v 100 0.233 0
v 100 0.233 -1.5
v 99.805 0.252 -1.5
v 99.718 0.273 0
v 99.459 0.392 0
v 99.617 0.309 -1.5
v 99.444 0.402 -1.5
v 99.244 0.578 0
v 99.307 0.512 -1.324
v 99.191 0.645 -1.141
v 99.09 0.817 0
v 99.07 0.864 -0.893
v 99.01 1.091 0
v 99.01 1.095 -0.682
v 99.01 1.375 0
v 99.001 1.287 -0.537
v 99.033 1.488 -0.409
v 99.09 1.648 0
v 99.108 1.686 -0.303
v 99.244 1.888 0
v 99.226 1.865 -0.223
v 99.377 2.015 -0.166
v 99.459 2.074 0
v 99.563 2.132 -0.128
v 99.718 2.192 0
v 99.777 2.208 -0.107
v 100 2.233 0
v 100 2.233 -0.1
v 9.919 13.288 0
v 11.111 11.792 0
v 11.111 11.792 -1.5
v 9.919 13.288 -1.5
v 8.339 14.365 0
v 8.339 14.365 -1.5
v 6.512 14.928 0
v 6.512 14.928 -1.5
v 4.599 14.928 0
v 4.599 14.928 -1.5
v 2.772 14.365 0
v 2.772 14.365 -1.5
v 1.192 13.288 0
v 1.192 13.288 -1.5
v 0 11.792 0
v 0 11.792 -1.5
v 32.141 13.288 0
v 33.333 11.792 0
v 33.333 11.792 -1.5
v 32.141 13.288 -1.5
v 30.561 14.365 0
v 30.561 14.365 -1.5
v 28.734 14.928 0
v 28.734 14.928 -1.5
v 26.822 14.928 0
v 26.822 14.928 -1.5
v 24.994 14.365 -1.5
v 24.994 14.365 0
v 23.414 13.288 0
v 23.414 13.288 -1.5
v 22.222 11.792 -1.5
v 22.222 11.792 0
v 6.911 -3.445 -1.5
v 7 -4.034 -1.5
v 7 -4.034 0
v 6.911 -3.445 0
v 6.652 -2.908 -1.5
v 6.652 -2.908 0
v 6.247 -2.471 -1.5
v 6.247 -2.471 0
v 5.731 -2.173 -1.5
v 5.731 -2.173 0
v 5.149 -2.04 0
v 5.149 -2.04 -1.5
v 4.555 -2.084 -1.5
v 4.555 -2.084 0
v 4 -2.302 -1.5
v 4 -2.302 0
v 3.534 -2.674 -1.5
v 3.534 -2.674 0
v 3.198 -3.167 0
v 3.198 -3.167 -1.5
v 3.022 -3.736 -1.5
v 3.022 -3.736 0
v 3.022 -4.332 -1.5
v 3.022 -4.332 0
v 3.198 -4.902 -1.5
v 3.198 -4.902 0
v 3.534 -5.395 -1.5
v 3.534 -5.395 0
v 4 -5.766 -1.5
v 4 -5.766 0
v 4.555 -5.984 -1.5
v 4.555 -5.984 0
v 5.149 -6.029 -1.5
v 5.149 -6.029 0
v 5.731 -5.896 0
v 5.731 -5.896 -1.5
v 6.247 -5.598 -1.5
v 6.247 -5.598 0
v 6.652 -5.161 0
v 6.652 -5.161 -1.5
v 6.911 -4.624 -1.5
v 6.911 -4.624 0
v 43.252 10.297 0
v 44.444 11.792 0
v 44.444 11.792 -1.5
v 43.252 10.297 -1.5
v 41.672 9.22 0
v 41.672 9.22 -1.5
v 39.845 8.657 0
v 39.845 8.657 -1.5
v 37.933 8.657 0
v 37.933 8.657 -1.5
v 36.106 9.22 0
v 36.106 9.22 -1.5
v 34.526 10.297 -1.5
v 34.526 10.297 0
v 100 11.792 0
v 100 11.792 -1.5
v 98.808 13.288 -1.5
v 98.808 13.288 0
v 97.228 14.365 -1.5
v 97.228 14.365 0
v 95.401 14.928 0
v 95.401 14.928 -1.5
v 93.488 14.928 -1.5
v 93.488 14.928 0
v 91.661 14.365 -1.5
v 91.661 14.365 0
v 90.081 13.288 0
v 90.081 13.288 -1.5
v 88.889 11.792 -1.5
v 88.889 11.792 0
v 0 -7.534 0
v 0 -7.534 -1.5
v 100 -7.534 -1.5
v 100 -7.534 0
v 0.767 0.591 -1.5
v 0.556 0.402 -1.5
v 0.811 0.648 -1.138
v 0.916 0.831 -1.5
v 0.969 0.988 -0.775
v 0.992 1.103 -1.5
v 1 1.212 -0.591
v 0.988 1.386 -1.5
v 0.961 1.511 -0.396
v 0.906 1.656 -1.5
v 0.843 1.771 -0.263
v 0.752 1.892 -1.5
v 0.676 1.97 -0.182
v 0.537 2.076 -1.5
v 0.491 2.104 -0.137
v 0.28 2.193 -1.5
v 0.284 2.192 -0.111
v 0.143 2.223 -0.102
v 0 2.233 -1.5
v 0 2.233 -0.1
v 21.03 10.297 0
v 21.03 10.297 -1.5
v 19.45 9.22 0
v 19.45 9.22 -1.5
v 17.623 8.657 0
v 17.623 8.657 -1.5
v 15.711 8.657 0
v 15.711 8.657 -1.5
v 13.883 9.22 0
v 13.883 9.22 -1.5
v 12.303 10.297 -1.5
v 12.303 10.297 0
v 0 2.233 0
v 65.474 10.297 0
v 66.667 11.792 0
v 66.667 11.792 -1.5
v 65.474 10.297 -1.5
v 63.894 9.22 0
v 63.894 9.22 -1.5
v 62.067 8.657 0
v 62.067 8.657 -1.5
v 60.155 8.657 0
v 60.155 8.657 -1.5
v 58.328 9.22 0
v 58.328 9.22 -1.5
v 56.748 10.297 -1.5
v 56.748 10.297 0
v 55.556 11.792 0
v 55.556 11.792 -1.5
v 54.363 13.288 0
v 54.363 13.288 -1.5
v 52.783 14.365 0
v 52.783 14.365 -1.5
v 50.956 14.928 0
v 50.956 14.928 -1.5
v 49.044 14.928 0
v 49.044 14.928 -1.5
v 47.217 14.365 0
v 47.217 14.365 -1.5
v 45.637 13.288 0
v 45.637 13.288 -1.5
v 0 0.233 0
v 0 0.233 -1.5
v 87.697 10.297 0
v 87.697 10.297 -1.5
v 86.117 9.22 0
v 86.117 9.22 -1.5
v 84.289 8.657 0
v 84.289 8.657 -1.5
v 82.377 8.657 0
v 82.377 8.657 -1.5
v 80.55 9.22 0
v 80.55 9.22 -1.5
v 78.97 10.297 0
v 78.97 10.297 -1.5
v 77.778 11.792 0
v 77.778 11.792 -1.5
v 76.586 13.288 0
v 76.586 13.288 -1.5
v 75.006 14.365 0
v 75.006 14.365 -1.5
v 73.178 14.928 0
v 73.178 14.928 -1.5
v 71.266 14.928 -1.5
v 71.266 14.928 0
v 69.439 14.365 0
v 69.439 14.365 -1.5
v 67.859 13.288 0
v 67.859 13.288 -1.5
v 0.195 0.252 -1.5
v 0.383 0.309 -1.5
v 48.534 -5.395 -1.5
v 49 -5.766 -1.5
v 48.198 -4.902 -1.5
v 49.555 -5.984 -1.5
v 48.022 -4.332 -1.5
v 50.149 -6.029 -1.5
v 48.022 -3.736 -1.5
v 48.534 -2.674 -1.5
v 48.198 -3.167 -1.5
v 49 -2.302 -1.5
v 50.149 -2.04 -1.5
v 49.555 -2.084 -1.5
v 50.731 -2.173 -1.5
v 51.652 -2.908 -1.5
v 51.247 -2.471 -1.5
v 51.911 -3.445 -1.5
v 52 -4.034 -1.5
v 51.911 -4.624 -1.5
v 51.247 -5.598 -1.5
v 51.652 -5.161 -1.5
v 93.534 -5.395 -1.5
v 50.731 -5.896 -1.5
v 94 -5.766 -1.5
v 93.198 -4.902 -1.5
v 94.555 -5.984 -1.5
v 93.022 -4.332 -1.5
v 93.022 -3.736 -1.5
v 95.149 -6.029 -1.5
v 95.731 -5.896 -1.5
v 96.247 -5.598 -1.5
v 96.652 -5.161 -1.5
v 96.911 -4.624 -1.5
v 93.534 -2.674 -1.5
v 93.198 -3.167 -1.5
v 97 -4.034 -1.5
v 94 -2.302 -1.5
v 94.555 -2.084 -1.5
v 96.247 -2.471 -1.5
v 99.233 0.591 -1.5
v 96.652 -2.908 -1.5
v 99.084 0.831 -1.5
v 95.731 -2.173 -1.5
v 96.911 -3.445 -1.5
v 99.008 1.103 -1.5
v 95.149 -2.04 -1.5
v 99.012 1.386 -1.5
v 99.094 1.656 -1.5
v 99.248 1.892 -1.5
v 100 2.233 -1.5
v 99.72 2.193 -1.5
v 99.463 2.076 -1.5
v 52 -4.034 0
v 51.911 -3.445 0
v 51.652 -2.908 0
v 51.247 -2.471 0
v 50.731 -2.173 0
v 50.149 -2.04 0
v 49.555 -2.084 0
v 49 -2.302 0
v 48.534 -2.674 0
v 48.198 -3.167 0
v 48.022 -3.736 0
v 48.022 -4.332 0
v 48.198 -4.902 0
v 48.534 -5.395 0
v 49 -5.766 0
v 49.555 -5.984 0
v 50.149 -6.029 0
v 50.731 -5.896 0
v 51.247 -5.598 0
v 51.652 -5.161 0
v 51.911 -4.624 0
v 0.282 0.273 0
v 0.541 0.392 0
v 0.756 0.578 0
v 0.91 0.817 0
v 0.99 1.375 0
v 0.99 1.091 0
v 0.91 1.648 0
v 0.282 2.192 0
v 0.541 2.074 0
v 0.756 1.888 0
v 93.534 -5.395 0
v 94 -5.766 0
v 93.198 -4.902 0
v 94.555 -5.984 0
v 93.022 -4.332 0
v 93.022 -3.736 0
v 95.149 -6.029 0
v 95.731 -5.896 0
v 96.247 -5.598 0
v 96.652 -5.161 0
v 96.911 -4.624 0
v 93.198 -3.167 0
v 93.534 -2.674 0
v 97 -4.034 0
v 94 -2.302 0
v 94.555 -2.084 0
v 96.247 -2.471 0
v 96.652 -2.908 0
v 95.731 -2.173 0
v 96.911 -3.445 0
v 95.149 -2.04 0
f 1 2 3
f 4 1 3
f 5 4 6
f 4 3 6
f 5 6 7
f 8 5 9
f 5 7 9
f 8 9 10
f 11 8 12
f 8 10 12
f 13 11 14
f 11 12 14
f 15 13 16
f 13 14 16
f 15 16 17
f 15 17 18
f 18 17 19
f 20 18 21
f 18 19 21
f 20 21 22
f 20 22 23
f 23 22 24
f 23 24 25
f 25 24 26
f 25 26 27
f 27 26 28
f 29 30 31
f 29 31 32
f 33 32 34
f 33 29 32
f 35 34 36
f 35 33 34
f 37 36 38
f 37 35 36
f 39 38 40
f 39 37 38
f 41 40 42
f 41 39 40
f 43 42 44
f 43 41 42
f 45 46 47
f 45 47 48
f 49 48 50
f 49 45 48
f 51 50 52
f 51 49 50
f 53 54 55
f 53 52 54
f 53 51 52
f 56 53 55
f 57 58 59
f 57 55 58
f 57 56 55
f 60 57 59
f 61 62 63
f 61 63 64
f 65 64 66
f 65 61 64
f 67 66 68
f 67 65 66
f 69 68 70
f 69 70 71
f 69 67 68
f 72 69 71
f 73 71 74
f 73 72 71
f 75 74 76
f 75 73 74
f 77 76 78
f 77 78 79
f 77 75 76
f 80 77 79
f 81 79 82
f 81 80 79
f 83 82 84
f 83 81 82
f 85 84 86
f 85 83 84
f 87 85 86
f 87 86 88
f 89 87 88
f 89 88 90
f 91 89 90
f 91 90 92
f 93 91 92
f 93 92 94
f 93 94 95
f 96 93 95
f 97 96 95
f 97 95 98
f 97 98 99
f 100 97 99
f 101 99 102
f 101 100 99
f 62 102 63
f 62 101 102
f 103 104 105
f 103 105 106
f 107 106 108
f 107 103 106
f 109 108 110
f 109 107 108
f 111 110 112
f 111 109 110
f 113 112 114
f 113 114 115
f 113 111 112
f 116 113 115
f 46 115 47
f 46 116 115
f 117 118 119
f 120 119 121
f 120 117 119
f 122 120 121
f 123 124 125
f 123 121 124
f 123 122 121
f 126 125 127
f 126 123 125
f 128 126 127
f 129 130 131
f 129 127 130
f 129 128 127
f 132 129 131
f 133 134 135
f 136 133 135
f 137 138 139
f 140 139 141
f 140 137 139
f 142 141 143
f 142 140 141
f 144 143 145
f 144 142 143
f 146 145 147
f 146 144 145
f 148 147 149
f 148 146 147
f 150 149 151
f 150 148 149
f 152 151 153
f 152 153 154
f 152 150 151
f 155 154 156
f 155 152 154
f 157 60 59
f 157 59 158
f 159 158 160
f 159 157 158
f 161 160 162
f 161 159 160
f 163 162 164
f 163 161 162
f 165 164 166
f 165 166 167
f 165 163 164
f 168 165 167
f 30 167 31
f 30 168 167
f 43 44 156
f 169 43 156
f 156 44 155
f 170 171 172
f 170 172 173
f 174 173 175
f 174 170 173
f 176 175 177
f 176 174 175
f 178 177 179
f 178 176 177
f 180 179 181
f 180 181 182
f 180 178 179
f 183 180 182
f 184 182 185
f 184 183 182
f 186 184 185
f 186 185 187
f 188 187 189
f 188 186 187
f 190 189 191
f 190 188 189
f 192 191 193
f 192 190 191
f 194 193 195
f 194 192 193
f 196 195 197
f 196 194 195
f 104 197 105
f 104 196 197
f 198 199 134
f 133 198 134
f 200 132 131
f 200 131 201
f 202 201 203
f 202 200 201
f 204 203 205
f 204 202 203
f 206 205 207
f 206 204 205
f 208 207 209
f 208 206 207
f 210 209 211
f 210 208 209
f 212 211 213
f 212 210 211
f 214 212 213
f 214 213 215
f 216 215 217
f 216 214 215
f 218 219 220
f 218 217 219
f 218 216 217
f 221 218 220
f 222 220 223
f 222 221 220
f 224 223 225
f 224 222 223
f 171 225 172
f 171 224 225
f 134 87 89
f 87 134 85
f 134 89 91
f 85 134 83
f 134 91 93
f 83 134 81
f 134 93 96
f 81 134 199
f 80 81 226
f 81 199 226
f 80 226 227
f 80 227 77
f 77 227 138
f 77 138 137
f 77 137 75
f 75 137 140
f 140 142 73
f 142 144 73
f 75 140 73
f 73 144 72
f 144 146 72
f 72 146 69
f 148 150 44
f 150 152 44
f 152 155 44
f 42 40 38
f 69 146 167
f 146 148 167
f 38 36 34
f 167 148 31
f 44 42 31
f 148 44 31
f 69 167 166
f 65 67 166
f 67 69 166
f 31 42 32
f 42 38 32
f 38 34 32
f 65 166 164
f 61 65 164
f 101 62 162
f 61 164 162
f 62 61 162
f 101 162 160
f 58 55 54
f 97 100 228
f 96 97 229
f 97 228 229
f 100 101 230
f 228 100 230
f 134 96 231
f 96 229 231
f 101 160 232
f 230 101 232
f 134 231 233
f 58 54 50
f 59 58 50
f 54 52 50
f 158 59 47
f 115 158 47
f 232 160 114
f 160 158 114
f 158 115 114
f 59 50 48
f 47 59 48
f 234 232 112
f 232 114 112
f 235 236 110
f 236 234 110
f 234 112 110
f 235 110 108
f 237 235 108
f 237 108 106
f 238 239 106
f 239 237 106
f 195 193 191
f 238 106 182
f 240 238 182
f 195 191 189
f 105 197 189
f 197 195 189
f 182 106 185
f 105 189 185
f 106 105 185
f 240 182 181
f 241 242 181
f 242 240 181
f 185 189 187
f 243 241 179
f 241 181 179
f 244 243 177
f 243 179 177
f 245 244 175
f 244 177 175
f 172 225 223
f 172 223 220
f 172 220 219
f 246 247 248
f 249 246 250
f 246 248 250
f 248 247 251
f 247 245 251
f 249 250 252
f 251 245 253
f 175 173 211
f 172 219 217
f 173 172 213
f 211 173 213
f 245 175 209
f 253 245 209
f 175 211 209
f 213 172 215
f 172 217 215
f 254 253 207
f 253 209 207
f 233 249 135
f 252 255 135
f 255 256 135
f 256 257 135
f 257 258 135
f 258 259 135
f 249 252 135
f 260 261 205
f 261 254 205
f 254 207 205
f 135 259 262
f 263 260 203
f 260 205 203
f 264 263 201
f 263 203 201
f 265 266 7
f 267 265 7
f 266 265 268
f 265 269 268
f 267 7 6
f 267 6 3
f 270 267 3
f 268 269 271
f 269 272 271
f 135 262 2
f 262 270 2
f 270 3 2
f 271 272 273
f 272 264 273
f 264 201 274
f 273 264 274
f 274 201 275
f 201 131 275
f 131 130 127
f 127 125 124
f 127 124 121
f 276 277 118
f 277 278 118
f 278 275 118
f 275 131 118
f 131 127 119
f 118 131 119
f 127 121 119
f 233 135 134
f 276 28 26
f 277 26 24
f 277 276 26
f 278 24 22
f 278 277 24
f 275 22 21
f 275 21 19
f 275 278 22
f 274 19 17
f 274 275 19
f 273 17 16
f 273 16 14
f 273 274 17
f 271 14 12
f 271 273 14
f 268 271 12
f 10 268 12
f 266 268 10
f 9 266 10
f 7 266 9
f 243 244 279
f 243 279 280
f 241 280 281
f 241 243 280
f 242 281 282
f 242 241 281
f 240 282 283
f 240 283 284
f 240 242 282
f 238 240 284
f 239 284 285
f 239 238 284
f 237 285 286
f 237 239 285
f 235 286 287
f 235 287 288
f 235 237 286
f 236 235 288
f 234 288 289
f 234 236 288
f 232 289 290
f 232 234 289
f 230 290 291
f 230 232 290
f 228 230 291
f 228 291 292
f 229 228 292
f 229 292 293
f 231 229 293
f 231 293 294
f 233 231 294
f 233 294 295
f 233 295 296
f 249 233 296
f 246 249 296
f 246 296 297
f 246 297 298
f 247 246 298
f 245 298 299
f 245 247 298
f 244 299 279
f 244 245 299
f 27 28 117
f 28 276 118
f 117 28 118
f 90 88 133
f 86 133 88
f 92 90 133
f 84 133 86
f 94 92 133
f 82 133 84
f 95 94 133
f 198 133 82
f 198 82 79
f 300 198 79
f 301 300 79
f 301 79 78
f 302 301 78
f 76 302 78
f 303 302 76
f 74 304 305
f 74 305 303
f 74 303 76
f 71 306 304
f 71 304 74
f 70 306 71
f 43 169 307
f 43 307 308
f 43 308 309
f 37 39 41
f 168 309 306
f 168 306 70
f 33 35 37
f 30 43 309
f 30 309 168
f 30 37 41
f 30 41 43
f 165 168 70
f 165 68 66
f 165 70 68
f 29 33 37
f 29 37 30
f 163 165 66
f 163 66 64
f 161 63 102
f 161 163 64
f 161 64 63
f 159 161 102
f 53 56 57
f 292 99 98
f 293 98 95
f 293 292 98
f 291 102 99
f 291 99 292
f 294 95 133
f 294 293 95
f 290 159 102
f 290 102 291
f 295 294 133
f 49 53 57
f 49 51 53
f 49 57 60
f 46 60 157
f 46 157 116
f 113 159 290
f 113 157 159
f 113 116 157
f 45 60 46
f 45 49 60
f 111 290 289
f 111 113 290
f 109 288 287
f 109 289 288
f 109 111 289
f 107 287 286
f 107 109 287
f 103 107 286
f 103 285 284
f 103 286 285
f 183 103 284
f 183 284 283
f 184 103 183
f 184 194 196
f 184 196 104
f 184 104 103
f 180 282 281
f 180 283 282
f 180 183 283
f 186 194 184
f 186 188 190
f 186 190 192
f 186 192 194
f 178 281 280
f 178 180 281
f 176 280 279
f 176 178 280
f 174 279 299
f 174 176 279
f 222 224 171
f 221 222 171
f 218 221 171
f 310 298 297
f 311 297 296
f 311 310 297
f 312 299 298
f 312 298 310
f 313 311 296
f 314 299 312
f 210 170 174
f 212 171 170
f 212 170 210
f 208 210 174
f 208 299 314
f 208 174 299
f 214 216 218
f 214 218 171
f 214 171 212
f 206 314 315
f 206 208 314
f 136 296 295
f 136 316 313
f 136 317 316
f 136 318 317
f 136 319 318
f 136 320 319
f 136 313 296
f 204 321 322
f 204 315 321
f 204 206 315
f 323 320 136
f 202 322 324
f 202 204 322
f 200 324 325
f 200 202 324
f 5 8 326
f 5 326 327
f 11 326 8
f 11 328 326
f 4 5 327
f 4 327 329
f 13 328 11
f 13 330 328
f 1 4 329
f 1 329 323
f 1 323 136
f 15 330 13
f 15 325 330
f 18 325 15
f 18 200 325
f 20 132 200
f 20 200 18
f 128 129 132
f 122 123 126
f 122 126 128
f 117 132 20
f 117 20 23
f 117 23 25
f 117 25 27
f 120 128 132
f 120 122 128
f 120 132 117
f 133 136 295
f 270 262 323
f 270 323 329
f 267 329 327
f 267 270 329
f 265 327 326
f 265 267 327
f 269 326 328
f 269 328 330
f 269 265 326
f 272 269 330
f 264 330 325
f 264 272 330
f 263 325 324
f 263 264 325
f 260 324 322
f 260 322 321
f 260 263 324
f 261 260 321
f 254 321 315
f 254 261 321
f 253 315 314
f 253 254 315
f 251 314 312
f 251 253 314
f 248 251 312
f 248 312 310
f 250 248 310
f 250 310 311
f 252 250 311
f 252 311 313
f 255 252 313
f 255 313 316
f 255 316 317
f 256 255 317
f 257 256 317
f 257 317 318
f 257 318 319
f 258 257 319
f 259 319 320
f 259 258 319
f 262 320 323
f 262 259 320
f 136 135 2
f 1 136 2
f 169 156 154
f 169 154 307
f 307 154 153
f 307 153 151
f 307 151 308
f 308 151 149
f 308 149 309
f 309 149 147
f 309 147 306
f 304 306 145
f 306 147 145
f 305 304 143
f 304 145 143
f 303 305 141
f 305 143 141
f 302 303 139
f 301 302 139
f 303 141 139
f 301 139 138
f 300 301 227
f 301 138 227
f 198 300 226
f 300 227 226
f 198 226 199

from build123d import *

# Parameters (mm, degrees)
SM_BASE_FLANGE_1_DEPTH    = 100
CUT_EXTRUDE_1_DEPTH       = 1.5
SKETCH_7_R                = 2
CUT_EXTRUDE_2_DEPTH       = 1.5
CUT_EXTRUDE_START         = -10
CUT_EXTRUDE_3_OUTLINE_W   = 100
CUT_EXTRUDE_3_OUTLINE_H   = 4
CUT_EXTRUDE_3_DEPTH       = 8.5
CUT_EXTRUDE_START_2       = -1.5
CUT_EXTRUDE_3_2_DEPTH     = 1.5
CUT_EXTRUDE_3_3_OUTLINE_R = 2
CUT_EXTRUDE_3_3_DEPTH     = 1.5


# Read off the part's stored shape, not the designer's step: Вырез-Вытянуть3
# Sheet-metal steps are written as plain solids
with BuildPart() as part:
    # Sketch 1 → Базовая кромка1 (new body)
    with BuildSketch(Plane(origin=(0, 0, 0), x_dir=(0, 0, -1), z_dir=(1, 0, 0))):
        with BuildLine():
            Line((10, 0), (3, 0))
            ThreePointArc((3, 0), (0.878679656, 0.878679656), (0, 3))
            Line((0, 3), (0, 15))
            Line((0, 15), (1.5, 15))
            Line((1.5, 15), (1.5, 3))
            ThreePointArc((1.5, 3), (1.939339828, 1.939339828), (3, 1.5))
            Line((3, 1.5), (10, 1.5))
            Line((10, 1.5), (10, 0))
        make_face()
    extrude(amount=SM_BASE_FLANGE_1_DEPTH)

    # Эскиз6 → Вырез-Вытянуть1 (cut)
    with BuildSketch(Plane.XY):
        with BuildLine():
            Line((0, 11.792498505), (0, 18.792498505))
            Line((0, 18.792498505), (100, 18.792498505))
            Line((100, 18.792498505), (100, 11.792498505))
            ThreePointArc((100, 11.792498505), (94.444444444, 15), (88.888888889, 11.792498505))
            ThreePointArc((88.888888889, 11.792498505), (83.333333333, 8.584997009), (77.777777778, 11.792498505))
            ThreePointArc((77.777777778, 11.792498505), (72.222222222, 15), (66.666666667, 11.792498505))
            ThreePointArc((66.666666667, 11.792498505), (61.111111111, 8.584997009), (55.555555556, 11.792498505))
            ThreePointArc((55.555555556, 11.792498505), (50, 15), (44.444444444, 11.792498505))
            ThreePointArc((44.444444444, 11.792498505), (38.888888889, 8.584997009), (33.333333333, 11.792498505))
            ThreePointArc((33.333333333, 11.792498505), (27.777777778, 15), (22.222222222, 11.792498505))
            ThreePointArc((22.222222222, 11.792498505), (16.666666667, 8.584997009), (11.111111111, 11.792498505))
            ThreePointArc((11.111111111, 11.792498505), (5.555555556, 15), (0, 11.792498505))
        make_face()
    extrude(amount=-CUT_EXTRUDE_1_DEPTH, mode=Mode.SUBTRACT)

    # Эскиз7 → Вырез-Вытянуть2 (cut)
    with BuildSketch(Plane(origin=(0, 1.5, 0), x_dir=(1, 0, 0), z_dir=(0, 1, 0))):
        with Locations(Location((50, 6.5, 0), (0, 0, 270))):
            Circle(SKETCH_7_R)
        with Locations(Location((95, 6.5, 0), (0, 0, 270))):
            Circle(SKETCH_7_R)
        with Locations(Location((5, 6.5, 0), (0, 0, 270))):
            Circle(SKETCH_7_R)
    extrude(amount=-CUT_EXTRUDE_2_DEPTH, mode=Mode.SUBTRACT)

    # Вырез-Вытянуть3 outline → Вырез-Вытянуть3 (cut)
    with BuildSketch(Plane.XY.offset(CUT_EXTRUDE_START)):
        with Locations((50, 2)):
            Rectangle(CUT_EXTRUDE_3_OUTLINE_W, CUT_EXTRUDE_3_OUTLINE_H)
    extrude(amount=CUT_EXTRUDE_3_DEPTH, mode=Mode.SUBTRACT)

    # Cut-Extrude 3 2 outline → Cut-Extrude 3 2 (cut)
    with BuildSketch(Plane.XY.offset(CUT_EXTRUDE_START_2)):
        with BuildLine():
            ThreePointArc((0, 0.232854132), (1, 1.232854132), (0, 2.232854132))
            Line((0, 2.232854132), (0, 0.232854132))
        make_face()
        with BuildLine():
            Line((100, 0.232854132), (100, 2.232854132))
            ThreePointArc((100, 2.232854132), (99, 1.232854132), (100, 0.232854132))
        make_face()
    extrude(amount=CUT_EXTRUDE_3_2_DEPTH, mode=Mode.SUBTRACT)

    # Cut-Extrude 3 3 outline → Cut-Extrude 3 3 (add)
    with BuildSketch(Plane.XY.offset(CUT_EXTRUDE_START_2)):
        with BuildLine():
            Line((0, 0.232854132), (0, -7.534291735))
            Line((0, -7.534291735), (100, -7.534291735))
            Line((100, -7.534291735), (100, 0.232854132))
            ThreePointArc((100, 0.232854132), (99, 1.232854132), (100, 2.232854132))
            Line((100, 2.232854132), (100, 4))
            Line((100, 4), (0, 4))
            Line((0, 4), (0, 2.232854132))
            ThreePointArc((0, 2.232854132), (1, 1.232854132), (0, 0.232854132))
        make_face()
        with Locations((95, -4.034291735)):
            Circle(CUT_EXTRUDE_3_3_OUTLINE_R, mode=Mode.SUBTRACT)
        with Locations((5, -4.034291735)):
            Circle(CUT_EXTRUDE_3_3_OUTLINE_R, mode=Mode.SUBTRACT)
        with Locations((50, -4.034291735)):
            Circle(CUT_EXTRUDE_3_3_OUTLINE_R, mode=Mode.SUBTRACT)
    extrude(amount=CUT_EXTRUDE_3_3_DEPTH)


solid = part.part
